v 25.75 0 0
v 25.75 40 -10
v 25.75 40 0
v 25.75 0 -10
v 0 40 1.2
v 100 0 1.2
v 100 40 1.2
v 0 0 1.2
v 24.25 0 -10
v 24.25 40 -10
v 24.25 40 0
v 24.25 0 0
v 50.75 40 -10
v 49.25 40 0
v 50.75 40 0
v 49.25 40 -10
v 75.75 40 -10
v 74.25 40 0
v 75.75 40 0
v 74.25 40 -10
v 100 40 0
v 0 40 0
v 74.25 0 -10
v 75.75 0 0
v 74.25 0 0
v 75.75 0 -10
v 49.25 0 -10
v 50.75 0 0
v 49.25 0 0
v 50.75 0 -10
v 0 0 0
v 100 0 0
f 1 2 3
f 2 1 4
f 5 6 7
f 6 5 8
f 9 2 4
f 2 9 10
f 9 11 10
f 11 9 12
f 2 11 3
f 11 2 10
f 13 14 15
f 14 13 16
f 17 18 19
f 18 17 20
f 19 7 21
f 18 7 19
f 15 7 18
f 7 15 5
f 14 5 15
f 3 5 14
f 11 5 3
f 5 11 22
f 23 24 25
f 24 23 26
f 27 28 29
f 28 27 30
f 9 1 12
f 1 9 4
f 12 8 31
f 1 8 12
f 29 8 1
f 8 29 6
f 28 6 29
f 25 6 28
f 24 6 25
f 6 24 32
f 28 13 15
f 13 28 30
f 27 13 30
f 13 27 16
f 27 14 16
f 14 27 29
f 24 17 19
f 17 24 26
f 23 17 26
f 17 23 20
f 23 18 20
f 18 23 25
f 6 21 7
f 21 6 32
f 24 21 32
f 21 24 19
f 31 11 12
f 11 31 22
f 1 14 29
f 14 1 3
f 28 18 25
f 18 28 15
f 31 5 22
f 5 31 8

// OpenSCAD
$fn = 32;

// ----------------------------------------------------------------------
// Ribbed panel: 1.2 mm panel
// ----------------------------------------------------------------------

// --- parameters (mm) ---
panel_l = 100;            // panel length, X
panel_w = 40;             // panel width, Y
panel_t = 1.2;            // panel thickness, Z
rib_t = 1.5;              // rib thickness
rib_h = 10;               // rib height below the panel
ribs = 3;                 // number of ribs
fit_tol = 0.02;           // tolerance for press fits, mm
free_tol = 0.2;           // tolerance for clearance fits, mm

total_h = panel_t + rib_h;  // overall height

union() {
  cube([panel_l, panel_w, panel_t]);
  for (i = [1 : ribs])
    translate([i * panel_l / (ribs + 1) - rib_t / 2, 0, -rib_h])
      cube([rib_t, panel_w, rib_h + panel_t]);
}
